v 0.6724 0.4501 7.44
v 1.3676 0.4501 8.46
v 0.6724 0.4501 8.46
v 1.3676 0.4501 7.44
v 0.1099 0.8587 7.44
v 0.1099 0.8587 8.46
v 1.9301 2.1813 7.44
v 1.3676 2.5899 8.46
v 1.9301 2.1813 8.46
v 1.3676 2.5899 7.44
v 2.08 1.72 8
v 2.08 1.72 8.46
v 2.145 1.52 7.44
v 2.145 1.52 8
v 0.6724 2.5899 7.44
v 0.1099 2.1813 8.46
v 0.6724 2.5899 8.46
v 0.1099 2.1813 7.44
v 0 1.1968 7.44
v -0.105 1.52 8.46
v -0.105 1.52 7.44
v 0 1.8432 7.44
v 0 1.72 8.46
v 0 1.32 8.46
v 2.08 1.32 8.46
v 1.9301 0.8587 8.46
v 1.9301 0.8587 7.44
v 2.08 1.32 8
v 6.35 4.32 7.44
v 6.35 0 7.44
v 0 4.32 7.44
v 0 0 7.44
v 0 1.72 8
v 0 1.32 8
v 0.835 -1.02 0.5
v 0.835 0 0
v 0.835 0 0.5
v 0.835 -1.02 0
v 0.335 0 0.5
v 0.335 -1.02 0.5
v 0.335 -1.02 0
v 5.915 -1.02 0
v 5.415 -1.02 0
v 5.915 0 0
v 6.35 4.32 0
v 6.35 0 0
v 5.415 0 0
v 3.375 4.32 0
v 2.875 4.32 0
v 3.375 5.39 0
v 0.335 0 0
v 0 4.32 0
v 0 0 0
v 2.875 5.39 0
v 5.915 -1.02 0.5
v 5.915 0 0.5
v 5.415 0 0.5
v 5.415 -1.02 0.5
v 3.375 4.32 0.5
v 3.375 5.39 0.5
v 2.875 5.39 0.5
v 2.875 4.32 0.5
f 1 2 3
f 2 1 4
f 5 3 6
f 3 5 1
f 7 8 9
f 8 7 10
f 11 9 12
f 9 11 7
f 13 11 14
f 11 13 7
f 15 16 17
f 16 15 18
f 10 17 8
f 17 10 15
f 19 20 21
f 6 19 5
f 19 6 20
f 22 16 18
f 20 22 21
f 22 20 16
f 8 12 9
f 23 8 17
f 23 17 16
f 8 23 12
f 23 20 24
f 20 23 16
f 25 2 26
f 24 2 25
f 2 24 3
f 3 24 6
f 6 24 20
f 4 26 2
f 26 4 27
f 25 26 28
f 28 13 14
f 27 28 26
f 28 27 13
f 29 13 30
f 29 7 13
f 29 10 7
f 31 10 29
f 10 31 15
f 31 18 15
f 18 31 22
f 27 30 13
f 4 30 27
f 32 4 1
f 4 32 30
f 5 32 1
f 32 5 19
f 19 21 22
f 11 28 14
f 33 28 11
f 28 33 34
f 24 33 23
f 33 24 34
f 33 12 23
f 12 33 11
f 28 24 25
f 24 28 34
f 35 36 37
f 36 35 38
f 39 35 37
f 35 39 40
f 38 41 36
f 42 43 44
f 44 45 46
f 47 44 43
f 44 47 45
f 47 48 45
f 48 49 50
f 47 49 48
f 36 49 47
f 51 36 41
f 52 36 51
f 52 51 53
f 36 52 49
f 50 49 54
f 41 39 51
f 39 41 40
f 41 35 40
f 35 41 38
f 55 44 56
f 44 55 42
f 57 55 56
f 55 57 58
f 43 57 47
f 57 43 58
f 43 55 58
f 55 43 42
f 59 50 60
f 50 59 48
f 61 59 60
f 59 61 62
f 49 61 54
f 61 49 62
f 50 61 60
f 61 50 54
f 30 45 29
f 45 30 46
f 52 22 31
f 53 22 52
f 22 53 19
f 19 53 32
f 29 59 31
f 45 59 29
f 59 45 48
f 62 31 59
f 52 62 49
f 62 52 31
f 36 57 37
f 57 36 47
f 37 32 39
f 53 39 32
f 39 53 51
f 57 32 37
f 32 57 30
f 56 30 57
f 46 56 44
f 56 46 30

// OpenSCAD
$fn=10;

color("lightblue") cube([6.35, 4.32, 7.44] );
color("gold") difference() {
    translate([1.02, 1.52, 7.44]) cylinder(d=2.25, h=1.02);
    translate([0, 1.52-0.2, 8]) cube([10, 0.4, 0.5]);
}
color("lightgray") {
    translate([6.25/2-2.54-0.5/2, -1.02, 0]) cube([0.5, 2.29, 0.5]);
    translate([6.25/2+2.54-0.5/2, -1.02, 0]) cube([0.5, 2.29, 0.5]);
    translate([6.25/2-0.5/2, -1.02+4.32-0.2, 0]) cube([0.5, 2.29, 0.5]);
    
}
